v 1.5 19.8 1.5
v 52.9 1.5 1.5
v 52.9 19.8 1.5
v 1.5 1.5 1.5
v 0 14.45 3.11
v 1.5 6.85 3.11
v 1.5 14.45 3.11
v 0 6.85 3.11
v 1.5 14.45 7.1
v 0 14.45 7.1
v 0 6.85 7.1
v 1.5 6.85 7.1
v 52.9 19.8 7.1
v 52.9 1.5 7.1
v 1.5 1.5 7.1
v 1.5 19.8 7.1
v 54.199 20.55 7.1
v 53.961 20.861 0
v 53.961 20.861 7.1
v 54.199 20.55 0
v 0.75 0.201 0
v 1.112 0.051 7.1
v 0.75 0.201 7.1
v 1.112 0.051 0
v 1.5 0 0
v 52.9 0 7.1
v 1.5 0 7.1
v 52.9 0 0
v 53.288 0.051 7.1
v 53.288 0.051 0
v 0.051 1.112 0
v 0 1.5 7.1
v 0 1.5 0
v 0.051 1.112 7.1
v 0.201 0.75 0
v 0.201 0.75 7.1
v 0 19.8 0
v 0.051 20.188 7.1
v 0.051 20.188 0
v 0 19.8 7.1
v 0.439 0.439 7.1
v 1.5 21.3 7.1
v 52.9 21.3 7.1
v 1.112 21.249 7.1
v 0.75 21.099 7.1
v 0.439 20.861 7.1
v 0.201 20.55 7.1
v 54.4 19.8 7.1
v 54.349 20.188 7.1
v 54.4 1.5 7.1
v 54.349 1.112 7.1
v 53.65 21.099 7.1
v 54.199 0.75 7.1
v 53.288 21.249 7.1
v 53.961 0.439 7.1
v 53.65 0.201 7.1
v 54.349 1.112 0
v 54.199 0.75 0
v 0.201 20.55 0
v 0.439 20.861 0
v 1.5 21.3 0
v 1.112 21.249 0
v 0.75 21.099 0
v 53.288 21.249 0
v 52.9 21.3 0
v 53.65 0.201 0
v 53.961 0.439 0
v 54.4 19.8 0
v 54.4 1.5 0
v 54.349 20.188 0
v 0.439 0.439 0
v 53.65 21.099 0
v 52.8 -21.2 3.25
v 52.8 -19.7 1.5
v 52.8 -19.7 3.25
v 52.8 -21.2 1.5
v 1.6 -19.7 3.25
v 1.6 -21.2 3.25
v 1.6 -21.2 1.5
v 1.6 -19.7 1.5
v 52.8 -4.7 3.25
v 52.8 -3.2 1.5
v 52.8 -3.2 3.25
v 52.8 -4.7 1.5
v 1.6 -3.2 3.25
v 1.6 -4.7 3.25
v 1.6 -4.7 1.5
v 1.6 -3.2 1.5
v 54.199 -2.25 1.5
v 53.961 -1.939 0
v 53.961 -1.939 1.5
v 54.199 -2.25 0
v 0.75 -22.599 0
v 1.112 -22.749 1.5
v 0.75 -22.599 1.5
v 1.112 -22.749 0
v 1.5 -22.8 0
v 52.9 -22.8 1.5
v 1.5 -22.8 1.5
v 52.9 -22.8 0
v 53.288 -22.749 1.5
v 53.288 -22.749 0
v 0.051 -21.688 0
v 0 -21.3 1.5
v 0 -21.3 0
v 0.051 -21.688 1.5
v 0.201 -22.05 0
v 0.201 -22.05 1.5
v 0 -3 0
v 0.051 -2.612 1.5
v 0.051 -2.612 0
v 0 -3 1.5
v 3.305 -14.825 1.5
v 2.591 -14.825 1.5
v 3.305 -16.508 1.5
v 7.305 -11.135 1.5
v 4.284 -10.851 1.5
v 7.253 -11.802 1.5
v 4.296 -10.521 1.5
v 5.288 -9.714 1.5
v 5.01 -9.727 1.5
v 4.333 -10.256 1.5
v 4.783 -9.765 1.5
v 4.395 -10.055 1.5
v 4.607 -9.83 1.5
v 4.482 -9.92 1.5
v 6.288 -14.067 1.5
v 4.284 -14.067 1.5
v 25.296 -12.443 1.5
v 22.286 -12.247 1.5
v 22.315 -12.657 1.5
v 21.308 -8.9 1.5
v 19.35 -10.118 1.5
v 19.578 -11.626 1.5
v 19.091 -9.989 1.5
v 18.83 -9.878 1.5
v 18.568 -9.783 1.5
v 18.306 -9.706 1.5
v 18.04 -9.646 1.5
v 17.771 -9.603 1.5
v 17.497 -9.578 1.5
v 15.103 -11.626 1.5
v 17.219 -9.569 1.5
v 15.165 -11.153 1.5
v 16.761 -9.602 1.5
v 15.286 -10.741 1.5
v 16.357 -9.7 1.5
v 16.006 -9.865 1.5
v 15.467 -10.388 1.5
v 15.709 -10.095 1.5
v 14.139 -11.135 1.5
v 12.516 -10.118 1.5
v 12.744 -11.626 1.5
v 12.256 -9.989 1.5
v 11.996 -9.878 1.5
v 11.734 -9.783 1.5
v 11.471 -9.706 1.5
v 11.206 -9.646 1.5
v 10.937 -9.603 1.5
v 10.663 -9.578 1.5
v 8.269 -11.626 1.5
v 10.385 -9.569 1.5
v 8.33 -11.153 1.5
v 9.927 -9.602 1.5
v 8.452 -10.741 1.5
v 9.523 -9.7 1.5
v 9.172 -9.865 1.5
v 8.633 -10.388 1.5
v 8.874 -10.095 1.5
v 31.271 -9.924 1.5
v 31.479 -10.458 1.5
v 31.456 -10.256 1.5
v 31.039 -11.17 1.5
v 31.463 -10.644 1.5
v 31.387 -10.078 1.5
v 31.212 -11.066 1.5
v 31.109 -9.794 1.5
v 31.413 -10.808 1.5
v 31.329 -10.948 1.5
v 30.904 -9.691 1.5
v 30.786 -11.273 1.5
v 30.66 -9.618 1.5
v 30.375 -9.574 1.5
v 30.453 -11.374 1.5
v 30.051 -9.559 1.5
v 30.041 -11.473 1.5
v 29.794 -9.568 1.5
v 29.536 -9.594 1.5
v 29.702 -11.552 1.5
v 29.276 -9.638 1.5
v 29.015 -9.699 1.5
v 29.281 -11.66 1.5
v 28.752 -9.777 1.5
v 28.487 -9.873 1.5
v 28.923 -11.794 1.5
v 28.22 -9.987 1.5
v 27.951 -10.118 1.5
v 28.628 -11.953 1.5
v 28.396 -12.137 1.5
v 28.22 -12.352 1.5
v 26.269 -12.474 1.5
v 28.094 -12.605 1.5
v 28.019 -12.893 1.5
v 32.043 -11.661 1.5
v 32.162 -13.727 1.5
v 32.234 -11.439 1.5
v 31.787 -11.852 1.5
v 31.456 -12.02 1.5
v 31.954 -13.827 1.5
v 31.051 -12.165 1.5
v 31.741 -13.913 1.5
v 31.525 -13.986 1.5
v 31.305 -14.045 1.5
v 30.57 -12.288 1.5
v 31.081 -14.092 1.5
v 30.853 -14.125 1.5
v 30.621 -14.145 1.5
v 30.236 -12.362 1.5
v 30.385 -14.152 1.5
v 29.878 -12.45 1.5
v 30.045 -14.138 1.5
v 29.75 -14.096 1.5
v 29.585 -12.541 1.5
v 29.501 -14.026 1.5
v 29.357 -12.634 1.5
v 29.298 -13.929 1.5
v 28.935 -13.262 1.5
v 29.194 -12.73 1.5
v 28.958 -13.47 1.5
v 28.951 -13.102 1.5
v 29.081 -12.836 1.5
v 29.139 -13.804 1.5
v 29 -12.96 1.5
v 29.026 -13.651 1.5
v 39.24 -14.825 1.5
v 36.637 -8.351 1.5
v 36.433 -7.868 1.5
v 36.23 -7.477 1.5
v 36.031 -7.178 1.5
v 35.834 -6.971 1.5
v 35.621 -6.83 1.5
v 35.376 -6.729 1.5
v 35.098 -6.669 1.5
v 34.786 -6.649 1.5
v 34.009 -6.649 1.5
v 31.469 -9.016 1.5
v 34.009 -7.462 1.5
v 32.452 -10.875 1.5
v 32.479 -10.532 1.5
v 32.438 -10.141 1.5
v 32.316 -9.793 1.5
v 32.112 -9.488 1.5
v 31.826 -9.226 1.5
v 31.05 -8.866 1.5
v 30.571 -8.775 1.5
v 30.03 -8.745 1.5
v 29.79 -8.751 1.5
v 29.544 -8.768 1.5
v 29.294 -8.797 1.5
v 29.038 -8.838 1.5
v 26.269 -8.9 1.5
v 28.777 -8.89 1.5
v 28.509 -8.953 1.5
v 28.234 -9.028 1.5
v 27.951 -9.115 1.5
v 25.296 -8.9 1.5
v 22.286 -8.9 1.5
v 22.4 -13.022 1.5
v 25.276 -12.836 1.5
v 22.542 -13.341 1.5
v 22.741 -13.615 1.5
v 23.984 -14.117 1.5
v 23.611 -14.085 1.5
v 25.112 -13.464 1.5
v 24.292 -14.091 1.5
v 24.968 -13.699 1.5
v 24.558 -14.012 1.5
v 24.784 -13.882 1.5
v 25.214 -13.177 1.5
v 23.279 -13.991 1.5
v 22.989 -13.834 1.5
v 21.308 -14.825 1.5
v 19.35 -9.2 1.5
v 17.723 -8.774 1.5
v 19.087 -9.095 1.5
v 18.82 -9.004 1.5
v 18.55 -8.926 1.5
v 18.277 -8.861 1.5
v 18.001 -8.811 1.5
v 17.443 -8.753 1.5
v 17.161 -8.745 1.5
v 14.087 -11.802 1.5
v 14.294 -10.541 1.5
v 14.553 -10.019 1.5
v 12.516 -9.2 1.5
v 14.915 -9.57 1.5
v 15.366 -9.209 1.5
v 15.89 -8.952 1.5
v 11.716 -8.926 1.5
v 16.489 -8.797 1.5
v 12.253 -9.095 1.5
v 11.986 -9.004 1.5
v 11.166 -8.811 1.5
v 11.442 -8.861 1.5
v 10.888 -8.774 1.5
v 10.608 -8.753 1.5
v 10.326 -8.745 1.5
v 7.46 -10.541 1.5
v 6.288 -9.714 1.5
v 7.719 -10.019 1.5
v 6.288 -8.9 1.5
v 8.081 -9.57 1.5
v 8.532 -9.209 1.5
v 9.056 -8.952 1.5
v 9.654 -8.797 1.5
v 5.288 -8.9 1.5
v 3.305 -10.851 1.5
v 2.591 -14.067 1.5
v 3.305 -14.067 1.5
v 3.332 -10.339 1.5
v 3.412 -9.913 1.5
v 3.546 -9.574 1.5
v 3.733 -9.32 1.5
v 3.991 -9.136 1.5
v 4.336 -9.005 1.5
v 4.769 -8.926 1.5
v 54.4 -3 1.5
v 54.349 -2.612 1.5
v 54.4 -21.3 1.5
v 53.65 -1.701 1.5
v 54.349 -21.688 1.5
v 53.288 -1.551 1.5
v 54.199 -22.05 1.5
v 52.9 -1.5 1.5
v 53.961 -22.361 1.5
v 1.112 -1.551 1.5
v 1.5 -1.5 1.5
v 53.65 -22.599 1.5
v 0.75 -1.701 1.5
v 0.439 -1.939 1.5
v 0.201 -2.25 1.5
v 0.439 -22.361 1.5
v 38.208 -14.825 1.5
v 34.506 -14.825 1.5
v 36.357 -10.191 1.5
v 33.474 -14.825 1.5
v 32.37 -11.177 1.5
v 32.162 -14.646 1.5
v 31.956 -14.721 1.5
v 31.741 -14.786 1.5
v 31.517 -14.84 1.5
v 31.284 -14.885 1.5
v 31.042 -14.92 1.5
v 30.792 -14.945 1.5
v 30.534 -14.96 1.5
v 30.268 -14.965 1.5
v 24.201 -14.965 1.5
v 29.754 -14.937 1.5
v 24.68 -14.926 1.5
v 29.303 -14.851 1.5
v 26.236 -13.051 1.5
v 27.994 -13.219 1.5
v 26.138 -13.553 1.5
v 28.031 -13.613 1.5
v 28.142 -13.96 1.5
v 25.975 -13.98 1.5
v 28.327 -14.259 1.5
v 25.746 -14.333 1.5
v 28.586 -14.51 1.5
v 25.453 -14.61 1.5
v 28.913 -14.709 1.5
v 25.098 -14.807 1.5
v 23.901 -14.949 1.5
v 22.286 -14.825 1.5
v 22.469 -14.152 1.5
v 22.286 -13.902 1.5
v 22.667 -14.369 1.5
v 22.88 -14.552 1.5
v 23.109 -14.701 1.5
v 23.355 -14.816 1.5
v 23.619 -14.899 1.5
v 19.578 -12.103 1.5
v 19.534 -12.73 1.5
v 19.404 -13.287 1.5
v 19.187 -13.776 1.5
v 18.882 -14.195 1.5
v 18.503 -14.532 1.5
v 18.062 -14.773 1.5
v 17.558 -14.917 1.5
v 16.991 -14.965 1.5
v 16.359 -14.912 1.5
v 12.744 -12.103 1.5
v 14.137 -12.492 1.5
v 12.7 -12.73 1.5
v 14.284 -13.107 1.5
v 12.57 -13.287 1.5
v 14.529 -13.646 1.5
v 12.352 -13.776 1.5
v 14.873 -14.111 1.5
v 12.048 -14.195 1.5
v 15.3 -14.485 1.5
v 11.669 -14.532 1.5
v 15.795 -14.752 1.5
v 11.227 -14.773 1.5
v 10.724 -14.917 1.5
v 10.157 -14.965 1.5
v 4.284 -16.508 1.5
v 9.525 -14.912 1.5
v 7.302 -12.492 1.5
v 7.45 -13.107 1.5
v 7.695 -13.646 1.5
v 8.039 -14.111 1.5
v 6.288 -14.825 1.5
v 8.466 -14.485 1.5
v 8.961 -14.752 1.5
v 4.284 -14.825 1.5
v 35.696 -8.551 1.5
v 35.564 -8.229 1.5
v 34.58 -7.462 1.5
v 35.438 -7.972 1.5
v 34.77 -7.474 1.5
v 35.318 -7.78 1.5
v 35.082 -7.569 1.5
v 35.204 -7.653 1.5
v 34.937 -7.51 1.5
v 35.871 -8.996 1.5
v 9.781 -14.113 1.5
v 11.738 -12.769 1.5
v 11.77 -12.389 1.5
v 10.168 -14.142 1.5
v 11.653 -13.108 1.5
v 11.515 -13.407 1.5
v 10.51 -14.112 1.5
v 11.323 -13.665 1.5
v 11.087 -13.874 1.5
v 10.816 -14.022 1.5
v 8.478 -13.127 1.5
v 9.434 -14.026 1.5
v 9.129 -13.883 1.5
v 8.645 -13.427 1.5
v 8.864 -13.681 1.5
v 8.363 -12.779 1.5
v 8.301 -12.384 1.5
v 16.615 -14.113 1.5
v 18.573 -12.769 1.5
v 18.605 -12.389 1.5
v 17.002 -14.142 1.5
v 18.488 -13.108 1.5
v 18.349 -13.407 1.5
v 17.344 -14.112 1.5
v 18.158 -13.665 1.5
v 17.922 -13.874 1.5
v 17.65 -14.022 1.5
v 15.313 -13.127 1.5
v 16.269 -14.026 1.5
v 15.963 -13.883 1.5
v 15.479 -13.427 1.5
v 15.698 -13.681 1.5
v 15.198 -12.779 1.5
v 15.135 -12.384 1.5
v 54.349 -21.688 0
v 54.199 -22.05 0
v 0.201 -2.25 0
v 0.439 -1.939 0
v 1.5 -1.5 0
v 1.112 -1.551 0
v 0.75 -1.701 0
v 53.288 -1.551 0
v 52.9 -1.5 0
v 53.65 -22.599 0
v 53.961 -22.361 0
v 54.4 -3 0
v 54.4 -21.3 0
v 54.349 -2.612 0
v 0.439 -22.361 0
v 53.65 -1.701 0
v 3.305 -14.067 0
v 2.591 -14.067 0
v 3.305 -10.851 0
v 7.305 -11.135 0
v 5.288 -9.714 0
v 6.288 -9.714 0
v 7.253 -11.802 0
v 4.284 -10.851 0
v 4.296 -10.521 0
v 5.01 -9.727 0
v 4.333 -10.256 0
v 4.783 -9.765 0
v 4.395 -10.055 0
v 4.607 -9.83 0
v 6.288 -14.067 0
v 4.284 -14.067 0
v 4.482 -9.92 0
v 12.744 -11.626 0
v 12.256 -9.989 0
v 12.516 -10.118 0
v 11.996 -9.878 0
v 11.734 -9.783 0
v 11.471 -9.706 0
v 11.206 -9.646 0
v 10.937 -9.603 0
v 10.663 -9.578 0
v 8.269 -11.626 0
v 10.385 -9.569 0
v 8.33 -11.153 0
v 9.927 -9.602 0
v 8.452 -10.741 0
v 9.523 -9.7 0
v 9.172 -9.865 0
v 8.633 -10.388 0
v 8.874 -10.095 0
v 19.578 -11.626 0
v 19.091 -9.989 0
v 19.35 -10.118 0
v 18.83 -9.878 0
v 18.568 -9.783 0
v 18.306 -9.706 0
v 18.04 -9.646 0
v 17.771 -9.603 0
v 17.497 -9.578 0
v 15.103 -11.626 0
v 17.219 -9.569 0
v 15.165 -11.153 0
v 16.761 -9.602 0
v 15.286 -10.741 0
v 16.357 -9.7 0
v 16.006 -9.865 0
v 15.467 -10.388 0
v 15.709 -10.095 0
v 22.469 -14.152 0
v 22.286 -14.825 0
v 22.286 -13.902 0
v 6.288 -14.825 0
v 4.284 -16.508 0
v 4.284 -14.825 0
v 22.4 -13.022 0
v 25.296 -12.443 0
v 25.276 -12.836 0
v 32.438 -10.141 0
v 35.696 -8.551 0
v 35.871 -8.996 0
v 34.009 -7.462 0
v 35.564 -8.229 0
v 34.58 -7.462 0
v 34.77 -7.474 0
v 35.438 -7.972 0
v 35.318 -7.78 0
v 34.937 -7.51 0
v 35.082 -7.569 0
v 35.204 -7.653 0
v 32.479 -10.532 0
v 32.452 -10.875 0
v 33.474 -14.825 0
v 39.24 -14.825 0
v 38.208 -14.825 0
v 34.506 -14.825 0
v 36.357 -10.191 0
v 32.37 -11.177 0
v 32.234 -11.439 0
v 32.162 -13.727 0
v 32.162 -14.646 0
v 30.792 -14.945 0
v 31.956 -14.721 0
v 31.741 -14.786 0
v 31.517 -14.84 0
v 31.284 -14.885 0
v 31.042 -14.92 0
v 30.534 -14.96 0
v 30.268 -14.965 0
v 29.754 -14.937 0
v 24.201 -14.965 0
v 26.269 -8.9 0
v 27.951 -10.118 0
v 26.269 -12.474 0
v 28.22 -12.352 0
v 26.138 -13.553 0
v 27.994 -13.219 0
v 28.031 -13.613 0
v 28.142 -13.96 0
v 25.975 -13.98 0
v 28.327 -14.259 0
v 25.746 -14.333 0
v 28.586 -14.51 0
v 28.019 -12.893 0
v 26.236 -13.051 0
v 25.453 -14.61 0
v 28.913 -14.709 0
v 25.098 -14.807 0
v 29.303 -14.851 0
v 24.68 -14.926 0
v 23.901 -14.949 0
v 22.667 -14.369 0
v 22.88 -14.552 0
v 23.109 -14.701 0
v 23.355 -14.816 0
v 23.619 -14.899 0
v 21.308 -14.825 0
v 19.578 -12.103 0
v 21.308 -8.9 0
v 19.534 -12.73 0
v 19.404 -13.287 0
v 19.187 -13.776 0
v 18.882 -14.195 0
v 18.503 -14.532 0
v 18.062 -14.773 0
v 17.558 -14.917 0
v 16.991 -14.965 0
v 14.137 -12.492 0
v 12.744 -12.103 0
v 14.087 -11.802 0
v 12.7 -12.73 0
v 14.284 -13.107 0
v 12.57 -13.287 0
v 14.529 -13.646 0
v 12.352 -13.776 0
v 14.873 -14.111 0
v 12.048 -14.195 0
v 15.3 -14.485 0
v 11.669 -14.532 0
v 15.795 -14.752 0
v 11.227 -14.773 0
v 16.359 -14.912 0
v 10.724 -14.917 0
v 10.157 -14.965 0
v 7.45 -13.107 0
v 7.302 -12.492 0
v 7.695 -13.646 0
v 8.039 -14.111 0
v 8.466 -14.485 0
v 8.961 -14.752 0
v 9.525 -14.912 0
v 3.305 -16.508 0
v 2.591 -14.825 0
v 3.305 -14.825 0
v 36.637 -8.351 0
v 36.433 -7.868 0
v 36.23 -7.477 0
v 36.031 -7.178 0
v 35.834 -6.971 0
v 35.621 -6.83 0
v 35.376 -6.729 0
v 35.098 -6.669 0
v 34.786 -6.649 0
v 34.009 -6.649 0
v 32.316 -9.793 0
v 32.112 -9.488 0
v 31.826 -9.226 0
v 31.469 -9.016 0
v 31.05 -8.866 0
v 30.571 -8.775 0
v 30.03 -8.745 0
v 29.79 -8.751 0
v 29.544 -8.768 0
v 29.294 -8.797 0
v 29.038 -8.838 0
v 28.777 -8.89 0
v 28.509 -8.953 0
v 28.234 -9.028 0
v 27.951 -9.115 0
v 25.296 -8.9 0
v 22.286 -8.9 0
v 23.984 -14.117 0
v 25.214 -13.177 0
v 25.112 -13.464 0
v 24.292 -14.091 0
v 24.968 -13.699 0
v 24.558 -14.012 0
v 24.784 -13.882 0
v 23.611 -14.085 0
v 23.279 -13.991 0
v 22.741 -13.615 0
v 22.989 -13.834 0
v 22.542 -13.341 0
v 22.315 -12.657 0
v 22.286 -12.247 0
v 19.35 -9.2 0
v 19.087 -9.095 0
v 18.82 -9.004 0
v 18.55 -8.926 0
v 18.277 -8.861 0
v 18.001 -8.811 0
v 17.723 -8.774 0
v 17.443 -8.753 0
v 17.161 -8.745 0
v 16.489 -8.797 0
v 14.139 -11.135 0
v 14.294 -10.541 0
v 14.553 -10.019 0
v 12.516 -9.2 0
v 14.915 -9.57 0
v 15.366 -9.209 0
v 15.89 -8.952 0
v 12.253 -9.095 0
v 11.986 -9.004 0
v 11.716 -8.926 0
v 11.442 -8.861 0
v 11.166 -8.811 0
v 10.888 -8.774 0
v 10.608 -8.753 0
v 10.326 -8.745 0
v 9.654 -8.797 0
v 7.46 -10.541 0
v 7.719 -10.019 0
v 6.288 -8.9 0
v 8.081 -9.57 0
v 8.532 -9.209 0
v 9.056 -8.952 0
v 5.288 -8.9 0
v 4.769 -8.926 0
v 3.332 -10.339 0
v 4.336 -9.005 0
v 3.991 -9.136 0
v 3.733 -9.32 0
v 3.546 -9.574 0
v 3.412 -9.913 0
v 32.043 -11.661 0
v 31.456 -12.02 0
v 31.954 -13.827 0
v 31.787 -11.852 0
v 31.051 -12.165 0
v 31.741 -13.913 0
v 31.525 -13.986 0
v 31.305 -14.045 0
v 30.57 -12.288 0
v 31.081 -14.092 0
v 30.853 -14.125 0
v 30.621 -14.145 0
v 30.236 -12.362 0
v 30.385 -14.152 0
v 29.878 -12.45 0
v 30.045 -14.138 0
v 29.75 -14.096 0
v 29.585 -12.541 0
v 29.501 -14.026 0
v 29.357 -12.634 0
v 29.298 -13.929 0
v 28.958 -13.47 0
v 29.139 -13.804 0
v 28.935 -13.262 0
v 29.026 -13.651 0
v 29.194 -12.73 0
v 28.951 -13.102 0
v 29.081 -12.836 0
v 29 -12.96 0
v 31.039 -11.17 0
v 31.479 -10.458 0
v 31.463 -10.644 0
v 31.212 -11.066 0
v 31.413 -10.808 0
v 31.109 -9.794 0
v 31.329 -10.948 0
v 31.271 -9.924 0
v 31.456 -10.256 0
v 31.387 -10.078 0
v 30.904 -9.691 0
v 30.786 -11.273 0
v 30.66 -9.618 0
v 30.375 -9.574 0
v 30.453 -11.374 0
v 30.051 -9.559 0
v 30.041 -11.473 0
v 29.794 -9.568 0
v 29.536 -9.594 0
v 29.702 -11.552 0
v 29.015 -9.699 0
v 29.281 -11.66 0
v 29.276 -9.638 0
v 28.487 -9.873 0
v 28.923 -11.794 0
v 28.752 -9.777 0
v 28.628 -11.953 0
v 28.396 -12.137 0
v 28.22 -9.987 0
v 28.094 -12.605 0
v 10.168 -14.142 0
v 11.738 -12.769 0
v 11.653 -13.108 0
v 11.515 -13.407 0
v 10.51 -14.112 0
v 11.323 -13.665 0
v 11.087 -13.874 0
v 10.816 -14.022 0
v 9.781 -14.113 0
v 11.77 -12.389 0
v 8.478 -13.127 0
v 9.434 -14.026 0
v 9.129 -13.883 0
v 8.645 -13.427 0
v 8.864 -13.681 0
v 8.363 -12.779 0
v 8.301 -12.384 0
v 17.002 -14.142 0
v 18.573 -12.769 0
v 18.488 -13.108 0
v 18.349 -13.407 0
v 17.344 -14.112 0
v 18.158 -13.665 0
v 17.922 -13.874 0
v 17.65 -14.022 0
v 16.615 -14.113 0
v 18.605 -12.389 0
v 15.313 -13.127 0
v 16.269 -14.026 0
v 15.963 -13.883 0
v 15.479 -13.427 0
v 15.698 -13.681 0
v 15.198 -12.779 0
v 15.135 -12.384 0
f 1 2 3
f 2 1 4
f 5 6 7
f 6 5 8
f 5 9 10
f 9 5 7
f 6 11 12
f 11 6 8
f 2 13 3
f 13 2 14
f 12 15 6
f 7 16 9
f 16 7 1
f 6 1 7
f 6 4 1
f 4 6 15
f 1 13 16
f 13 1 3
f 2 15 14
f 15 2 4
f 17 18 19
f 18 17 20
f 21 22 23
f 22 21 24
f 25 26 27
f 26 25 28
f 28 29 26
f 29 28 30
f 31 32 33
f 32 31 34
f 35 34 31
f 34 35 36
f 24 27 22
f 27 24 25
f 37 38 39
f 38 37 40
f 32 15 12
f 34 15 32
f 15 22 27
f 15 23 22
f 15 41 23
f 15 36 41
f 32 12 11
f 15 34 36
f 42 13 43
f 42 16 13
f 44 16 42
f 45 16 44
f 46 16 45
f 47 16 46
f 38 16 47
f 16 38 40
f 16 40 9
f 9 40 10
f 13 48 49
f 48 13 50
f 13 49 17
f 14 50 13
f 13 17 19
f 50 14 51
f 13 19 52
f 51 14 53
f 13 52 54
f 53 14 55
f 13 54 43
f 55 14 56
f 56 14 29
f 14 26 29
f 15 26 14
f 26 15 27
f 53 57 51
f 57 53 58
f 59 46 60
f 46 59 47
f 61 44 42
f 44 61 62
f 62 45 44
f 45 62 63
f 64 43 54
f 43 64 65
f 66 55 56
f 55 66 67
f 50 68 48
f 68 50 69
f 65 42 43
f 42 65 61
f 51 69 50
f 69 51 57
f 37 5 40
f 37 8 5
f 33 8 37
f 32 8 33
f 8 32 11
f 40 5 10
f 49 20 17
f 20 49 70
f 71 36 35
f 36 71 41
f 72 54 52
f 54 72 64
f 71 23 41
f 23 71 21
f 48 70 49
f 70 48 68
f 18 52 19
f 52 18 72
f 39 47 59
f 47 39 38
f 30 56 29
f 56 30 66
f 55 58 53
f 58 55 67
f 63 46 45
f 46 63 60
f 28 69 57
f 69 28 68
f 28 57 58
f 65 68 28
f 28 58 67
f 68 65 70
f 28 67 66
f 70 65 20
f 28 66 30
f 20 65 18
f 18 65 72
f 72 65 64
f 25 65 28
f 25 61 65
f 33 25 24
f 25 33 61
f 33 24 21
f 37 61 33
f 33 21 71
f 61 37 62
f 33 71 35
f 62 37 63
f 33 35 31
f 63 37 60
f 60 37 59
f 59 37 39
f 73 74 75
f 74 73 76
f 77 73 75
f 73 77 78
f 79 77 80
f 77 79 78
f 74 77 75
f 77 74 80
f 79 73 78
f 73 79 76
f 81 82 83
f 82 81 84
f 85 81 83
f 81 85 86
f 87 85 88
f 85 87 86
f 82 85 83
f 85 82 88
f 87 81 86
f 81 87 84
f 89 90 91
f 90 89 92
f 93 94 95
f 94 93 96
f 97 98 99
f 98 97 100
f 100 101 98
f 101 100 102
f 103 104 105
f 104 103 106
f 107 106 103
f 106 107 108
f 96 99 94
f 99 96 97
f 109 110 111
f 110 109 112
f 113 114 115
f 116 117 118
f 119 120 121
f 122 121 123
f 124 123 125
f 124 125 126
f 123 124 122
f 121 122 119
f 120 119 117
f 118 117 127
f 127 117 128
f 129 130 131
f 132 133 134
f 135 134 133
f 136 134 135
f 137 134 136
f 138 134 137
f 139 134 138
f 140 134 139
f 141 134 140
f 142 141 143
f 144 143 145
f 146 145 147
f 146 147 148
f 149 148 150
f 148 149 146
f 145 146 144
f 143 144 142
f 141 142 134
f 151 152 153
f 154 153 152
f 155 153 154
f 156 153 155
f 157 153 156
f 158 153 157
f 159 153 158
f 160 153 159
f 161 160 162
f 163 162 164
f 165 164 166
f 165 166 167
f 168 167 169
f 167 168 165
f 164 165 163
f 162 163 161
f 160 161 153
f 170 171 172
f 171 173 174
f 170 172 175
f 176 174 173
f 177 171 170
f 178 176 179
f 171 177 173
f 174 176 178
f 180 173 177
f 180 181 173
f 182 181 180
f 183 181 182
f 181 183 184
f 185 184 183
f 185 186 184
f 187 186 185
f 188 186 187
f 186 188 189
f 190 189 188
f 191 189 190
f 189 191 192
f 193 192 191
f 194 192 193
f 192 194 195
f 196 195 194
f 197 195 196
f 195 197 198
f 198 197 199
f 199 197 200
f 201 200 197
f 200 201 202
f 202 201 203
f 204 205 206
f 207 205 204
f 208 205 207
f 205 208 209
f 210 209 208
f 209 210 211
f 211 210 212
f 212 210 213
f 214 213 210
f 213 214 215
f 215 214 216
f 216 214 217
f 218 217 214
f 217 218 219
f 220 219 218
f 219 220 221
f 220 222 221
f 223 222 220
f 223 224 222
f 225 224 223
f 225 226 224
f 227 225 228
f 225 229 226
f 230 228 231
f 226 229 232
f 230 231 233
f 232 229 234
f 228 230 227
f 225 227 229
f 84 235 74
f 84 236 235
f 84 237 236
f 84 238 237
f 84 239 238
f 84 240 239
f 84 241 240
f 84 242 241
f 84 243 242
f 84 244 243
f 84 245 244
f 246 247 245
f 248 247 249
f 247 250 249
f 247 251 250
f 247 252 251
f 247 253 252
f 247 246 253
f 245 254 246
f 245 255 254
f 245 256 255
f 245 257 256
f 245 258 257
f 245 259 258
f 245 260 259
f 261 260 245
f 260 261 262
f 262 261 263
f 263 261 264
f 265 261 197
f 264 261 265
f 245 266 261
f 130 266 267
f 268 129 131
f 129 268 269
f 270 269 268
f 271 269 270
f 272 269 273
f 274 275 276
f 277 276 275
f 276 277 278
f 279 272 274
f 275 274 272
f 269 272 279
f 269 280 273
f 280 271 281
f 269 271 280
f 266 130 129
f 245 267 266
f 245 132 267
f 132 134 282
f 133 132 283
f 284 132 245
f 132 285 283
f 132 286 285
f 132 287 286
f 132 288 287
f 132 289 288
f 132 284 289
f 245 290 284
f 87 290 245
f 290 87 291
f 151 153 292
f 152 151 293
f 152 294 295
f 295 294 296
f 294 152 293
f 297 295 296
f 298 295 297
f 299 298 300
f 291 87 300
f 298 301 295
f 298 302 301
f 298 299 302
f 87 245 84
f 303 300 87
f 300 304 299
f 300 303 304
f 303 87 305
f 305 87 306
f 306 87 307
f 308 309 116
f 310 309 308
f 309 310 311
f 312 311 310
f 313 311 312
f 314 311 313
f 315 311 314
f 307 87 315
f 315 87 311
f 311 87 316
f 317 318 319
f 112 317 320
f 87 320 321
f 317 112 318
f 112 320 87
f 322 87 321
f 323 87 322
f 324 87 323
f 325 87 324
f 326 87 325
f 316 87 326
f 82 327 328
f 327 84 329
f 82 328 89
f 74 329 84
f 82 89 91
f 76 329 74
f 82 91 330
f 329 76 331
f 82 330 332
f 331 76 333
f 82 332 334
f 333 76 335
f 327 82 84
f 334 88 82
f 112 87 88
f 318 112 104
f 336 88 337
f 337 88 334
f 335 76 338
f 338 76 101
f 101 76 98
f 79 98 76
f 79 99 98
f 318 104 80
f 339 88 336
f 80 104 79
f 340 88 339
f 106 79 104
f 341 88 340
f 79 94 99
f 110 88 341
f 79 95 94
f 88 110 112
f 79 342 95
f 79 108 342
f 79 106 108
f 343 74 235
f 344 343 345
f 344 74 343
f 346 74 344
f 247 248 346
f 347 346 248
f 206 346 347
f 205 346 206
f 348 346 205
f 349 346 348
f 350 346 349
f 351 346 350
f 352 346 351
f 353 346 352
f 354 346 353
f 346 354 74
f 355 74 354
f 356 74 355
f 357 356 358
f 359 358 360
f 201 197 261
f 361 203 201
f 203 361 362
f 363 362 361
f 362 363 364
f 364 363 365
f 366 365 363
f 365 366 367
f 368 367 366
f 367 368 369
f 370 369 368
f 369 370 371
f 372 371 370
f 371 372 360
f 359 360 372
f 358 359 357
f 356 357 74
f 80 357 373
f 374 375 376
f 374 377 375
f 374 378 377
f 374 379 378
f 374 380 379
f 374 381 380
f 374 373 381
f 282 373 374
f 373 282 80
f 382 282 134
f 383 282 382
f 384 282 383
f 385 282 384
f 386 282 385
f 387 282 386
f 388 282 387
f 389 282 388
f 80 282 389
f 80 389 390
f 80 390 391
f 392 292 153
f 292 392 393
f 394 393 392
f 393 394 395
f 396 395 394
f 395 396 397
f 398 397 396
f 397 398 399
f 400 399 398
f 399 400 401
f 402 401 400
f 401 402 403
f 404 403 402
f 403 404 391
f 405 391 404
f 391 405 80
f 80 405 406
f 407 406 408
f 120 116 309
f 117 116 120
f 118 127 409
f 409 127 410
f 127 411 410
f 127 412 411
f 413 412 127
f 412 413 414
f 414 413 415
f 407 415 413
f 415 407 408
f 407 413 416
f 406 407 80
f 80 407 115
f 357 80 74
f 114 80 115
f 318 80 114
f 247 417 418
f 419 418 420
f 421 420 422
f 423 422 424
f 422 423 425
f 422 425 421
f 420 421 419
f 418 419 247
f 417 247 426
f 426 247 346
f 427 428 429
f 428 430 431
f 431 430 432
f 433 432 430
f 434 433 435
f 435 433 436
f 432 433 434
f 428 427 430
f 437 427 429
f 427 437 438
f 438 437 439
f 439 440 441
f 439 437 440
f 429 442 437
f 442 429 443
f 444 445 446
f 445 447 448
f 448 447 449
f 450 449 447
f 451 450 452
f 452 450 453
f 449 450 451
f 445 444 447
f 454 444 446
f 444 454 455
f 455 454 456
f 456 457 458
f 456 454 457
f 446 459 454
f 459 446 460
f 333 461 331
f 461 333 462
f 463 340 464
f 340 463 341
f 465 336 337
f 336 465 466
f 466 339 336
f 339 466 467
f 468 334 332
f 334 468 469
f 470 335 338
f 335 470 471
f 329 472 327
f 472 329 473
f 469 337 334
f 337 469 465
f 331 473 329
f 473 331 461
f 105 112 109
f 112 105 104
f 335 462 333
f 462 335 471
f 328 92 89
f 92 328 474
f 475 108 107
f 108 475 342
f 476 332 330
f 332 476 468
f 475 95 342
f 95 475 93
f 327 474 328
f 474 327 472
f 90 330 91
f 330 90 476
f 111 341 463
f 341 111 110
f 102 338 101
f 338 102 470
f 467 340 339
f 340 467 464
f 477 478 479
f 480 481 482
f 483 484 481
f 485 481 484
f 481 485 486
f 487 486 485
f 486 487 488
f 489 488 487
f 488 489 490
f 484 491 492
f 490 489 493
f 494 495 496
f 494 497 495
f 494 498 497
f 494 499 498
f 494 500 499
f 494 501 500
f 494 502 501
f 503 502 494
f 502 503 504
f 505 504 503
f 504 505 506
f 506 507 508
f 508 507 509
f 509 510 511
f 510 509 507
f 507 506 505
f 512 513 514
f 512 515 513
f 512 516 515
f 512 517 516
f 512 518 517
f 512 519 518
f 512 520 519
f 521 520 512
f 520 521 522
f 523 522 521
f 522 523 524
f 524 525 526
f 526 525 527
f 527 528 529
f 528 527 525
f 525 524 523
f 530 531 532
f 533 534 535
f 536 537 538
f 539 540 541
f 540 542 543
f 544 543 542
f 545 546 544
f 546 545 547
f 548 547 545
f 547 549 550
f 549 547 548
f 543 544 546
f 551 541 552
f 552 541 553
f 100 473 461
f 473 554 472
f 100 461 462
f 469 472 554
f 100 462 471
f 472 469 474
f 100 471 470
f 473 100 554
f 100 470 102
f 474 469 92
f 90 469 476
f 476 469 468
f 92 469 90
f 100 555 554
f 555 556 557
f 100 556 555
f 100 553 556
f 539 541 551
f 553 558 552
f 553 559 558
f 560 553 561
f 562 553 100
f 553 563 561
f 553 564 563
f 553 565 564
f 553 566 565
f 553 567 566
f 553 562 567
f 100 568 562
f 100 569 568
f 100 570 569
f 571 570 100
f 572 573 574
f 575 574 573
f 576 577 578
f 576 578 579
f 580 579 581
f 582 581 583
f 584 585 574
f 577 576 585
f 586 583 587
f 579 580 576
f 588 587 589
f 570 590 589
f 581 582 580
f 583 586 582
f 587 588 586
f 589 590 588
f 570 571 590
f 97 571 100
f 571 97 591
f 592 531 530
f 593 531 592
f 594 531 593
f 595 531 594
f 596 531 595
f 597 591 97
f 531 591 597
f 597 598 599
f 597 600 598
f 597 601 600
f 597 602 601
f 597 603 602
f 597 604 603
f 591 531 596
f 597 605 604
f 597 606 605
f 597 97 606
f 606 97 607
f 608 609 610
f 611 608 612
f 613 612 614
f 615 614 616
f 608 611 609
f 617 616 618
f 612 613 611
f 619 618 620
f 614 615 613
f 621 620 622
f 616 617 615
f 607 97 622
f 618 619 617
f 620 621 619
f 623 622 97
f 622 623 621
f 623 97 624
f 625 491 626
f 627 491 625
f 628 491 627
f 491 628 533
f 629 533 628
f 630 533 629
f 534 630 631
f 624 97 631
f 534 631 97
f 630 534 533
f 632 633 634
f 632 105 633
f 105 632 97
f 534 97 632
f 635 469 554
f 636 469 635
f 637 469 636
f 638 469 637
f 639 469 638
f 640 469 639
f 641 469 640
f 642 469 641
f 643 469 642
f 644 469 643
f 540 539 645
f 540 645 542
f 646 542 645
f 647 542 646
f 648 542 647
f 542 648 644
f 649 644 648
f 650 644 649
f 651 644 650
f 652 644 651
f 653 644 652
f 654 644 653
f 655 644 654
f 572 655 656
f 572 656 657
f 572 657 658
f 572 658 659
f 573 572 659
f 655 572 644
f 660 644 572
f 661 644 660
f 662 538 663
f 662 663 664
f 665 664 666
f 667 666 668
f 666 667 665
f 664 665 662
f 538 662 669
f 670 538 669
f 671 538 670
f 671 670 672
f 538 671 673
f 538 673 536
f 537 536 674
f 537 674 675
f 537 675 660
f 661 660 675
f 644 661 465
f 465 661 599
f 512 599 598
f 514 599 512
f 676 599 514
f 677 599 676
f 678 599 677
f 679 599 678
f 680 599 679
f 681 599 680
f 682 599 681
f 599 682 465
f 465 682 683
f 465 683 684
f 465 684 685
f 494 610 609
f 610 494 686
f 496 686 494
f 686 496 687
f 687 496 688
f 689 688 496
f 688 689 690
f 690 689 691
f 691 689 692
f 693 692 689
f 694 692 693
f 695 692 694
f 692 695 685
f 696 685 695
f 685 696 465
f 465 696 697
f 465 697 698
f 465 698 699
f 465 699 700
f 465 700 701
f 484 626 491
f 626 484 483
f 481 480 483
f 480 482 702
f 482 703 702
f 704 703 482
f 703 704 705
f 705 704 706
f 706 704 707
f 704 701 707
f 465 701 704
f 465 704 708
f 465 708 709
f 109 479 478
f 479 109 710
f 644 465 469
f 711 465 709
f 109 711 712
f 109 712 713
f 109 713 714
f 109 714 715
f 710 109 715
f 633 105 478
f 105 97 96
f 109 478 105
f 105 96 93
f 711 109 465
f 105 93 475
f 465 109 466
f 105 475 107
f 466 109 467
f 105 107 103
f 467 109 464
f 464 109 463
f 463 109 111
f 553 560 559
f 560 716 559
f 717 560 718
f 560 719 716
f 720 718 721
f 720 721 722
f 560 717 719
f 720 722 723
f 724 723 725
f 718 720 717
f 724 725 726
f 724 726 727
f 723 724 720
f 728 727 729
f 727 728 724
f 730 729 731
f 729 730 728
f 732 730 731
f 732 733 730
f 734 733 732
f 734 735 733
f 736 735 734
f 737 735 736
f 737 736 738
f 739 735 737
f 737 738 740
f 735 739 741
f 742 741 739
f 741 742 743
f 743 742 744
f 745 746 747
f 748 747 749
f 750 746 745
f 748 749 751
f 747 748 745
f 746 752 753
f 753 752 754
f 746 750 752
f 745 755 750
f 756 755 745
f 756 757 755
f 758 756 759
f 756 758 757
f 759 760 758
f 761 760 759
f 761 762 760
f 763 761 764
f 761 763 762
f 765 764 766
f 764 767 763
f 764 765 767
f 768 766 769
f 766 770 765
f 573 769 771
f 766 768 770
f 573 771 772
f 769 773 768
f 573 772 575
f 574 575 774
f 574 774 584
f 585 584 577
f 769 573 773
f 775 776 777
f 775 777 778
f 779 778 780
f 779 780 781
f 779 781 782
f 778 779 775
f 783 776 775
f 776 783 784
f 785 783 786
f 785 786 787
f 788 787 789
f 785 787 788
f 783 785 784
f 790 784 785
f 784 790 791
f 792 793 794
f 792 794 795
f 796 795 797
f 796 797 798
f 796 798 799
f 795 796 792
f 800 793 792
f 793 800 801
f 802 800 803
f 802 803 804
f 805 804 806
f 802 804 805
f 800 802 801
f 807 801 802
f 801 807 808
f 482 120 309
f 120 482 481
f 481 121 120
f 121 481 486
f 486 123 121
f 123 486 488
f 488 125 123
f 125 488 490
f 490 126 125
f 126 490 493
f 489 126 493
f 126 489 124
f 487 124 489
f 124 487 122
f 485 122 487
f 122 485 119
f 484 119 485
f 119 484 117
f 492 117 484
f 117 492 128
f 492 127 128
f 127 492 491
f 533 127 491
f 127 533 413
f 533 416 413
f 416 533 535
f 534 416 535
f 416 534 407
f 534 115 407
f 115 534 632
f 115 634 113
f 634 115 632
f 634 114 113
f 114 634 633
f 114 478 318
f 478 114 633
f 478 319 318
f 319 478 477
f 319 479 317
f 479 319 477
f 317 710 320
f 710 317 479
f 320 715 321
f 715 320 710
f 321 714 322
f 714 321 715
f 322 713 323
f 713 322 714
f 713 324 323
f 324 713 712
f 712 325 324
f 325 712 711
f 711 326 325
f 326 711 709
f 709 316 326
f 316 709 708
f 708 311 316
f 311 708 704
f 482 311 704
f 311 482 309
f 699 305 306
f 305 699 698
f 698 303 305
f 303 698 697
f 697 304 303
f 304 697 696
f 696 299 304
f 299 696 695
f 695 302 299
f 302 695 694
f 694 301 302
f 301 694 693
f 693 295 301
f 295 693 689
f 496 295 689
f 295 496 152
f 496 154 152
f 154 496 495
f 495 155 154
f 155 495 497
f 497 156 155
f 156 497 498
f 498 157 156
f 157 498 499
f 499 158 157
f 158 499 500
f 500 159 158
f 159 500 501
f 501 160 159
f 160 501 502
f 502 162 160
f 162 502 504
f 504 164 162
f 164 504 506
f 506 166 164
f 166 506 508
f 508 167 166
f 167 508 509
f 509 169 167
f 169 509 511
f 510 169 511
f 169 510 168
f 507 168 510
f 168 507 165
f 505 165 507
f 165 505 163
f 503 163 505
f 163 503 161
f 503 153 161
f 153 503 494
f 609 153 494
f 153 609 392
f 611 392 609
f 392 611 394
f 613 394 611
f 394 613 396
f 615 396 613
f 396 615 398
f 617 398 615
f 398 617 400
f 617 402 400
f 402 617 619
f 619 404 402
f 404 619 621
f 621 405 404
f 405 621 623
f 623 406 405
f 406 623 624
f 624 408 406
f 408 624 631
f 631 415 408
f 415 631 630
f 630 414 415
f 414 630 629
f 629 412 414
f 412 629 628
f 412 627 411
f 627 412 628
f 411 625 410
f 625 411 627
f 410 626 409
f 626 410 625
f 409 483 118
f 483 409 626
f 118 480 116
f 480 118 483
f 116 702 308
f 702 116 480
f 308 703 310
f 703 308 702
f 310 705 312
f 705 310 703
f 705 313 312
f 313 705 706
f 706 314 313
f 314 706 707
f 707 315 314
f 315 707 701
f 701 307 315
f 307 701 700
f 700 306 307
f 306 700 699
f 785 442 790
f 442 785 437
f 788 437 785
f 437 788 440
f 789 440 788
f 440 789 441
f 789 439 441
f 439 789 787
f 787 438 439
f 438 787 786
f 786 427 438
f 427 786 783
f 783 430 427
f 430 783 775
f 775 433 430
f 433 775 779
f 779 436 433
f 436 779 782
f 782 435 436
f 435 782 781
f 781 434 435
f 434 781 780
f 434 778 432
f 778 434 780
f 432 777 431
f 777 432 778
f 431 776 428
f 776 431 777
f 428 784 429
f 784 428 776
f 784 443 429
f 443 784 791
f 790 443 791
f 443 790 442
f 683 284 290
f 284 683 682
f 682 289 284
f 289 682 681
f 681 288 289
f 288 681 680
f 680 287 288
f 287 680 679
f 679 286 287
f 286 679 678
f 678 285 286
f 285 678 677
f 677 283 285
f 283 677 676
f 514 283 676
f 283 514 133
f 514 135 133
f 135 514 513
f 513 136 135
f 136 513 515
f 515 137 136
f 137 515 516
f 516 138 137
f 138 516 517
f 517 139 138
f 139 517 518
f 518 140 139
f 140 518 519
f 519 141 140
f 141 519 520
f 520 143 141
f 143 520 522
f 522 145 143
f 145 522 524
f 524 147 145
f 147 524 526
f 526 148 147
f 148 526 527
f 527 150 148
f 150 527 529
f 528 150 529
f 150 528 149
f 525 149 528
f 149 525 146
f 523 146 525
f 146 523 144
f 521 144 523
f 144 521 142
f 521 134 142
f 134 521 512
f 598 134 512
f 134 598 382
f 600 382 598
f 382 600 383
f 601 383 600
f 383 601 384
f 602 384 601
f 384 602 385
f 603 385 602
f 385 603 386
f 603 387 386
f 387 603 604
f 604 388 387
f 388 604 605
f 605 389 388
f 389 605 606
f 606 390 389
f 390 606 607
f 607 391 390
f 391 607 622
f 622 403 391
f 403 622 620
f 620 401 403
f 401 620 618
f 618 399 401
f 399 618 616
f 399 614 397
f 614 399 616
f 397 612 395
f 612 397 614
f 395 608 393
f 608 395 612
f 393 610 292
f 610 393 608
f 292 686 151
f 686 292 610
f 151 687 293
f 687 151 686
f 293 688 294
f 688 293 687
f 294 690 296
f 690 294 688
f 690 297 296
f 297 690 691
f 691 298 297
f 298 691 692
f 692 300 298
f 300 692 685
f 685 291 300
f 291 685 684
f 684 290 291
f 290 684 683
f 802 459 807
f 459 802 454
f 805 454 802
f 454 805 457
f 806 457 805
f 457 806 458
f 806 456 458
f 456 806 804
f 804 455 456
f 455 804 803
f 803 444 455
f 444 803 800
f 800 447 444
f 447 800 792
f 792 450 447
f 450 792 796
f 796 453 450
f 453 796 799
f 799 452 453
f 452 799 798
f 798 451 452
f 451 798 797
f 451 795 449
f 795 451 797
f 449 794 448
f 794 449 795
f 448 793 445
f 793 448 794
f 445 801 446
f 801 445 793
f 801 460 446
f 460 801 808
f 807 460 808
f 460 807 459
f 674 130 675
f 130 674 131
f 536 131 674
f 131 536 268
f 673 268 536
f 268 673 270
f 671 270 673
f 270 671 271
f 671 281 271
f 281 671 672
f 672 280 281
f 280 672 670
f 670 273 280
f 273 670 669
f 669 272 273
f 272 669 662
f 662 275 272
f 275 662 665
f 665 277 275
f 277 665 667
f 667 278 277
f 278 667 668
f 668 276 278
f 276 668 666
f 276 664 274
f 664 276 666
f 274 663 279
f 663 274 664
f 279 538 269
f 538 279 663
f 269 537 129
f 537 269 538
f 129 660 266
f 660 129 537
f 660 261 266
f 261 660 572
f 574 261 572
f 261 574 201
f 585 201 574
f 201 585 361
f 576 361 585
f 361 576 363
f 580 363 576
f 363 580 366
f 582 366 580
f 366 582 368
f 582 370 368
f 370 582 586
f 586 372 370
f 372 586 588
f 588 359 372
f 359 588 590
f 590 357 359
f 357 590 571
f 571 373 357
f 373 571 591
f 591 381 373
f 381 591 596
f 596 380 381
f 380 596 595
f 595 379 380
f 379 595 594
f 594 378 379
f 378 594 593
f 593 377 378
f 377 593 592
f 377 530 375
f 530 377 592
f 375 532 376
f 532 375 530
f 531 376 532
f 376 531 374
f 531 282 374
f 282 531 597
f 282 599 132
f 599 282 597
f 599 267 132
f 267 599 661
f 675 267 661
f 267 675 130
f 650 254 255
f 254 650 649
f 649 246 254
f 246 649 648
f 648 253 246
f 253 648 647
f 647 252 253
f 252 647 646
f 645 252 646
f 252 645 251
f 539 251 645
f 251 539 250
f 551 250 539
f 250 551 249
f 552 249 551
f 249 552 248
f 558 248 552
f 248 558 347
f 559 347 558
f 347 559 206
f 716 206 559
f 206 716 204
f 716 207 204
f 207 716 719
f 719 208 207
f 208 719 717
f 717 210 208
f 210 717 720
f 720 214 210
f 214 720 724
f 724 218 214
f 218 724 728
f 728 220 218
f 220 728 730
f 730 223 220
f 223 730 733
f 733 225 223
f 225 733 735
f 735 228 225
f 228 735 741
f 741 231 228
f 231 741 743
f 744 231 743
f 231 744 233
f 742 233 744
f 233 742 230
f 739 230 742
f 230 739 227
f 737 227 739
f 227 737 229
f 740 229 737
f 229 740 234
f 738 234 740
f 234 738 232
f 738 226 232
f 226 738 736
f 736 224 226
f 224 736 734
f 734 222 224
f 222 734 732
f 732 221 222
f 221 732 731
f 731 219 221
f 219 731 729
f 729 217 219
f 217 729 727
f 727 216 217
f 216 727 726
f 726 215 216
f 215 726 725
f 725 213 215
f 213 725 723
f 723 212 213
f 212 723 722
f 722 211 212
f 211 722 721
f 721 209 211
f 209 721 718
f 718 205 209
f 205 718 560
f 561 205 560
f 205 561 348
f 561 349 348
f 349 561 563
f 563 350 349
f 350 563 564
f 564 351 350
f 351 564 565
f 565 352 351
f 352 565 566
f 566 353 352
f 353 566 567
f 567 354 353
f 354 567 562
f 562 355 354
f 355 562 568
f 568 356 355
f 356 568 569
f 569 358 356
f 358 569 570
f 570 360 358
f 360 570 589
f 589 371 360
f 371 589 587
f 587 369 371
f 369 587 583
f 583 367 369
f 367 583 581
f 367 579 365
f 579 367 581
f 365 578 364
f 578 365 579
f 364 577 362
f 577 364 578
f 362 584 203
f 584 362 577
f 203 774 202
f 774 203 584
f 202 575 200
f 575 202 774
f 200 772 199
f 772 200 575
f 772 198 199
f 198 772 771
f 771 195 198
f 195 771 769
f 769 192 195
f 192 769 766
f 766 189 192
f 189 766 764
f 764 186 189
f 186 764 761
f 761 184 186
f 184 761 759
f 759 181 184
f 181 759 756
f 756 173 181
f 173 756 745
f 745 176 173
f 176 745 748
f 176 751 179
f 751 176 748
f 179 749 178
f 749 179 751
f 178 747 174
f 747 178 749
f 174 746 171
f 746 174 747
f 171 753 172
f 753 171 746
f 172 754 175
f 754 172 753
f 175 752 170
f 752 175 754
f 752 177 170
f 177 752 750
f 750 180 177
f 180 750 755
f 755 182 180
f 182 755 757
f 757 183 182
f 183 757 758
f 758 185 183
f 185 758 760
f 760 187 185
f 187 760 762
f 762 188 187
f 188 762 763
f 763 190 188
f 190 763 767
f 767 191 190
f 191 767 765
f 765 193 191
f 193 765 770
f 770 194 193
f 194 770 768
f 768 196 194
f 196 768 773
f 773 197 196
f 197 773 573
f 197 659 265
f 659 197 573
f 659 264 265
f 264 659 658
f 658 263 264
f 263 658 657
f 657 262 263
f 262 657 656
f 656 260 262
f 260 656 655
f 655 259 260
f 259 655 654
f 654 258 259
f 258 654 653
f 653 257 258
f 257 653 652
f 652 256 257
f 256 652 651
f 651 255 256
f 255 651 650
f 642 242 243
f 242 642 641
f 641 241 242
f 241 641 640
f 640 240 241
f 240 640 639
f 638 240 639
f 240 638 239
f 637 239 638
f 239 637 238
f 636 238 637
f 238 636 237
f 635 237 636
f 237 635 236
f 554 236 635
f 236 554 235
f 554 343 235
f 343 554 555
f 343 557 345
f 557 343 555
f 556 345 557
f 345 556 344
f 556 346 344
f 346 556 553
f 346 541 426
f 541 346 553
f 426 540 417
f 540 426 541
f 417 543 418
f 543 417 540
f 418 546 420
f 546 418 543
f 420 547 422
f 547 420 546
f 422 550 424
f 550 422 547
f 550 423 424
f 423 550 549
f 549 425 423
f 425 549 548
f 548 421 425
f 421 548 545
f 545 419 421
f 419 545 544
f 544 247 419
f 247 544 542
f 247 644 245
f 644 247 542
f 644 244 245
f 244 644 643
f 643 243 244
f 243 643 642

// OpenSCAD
// file: Teensy++2.scad
// Teensy++ 2 
// Loic - Novemeber 2017


teensyplusplus2();

board_length 	= 51.2;
board_width		= 18.1;
board_height	= 1.6 + 4;	// board + usb connector

// reset button
module resetButton()
{
	color("grey")
		cube(size=[3,4,1], center=false);

	translate([1.5,2,1])
	color("black")
		cylinder(h=0.5, r=1, center=false, $fn=20);
}

module microUSBConnector()
{
	cube(size=[9.9 + 5,7.6,4], center=false);	// + 5 is dummy long for thick wall
}

//board
module teensyplusplus2()
{
	color("green")
		cube(size=[board_length,board_width,board_height], center=false);

	translate([45,9.05-2,board_height])
		resetButton();

	translate([-5,5.25,1.61])
		microUSBConnector();
}
// main file
// Teensy++ 2 Enclosure
// Loic - Novemeber 2017

use <Teensy++2.scad>


//TODO NEED FIXING, asymetric

board_length 	= 51.2;
board_width		= 18.1;
board_height	= 1.6 + 4;	// board + usb connector
walls_depth		= 1.5;
clearance		= 0.1;		// margin for print tolerance .1mm

label 			= "teensy";


// MAIN //

box_rounded();
translate([0,-box_width - walls_depth,0])
	top_rounded_with_label();

//box();
//translate([0,-box_width - walls_depth,0])
//	top_with_label();

//////////

font_name = "wipeoutfusion";
font_size = 7.8;
font_spacing = 1.05;

$fn=24;

///////
box_length		= walls_depth + clearance + board_length + clearance + walls_depth;
box_width		= walls_depth + clearance + board_width + clearance + walls_depth;
box_height		= walls_depth + board_height;

inside_length	= clearance + board_length + clearance;
inside_width	= clearance + board_width + clearance;
inside_height	= walls_depth + board_height;


module label()
{
	position = ((box_length - (len(label)*font_size)) / 2) - walls_depth;
	echo(position);
	// position = (len(label) * font_size) / 6.8;

	translate([position,(box_width/2)+(font_size/2.4),walls_depth*2])
	rotate([180,0,0])
	linear_extrude(walls_depth * 4)
		text(label, font = font_name, size=font_size,spacing=font_spacing);
}

module box_rounded()
{
	difference()
	{
		box_rounded_outside();
		inner_space();
	}
}

module box_rounded_outside()
{
hull()
	{
		translate([walls_depth,walls_depth ,0 ])
			cylinder(box_height, walls_depth, walls_depth, center=false );

		translate([box_length-walls_depth,walls_depth ,0 ])
			cylinder(box_height, walls_depth, walls_depth, center=false);

		translate([box_length-walls_depth, box_width-walls_depth,0 ])
			cylinder(box_height, walls_depth, walls_depth, center=false);

		translate([walls_depth,box_width - walls_depth ,0 ])
			cylinder(box_height, walls_depth, walls_depth, center=false);
	}
}

module top_rounded()
{
hull()
	{
		translate([walls_depth,walls_depth ,0 ])
			cylinder(walls_depth, walls_depth, walls_depth, center=false);

		translate([box_length-walls_depth,walls_depth ,0 ])
			cylinder(walls_depth, walls_depth, walls_depth, center=false);

		translate([box_length-walls_depth, box_width-walls_depth,0 ])
			cylinder(walls_depth, walls_depth, walls_depth, center=false);

		translate([walls_depth,box_width - walls_depth ,0 ])
			cylinder(walls_depth, walls_depth, walls_depth, center=false);
	}
	// tabs / rails
	color("purple")
	{
		translate([walls_depth + clearance, walls_depth + clearance,1])
			cube(size=[box_length - 2*(walls_depth + clearance),walls_depth,walls_depth*1.5], center=false);

		translate([walls_depth + clearance, box_width - 2 * (walls_depth + clearance) ,1])
			cube(size=[box_length - 2*(walls_depth + clearance),walls_depth,walls_depth*1.5], center=false);
	}
}

module top_rounded_with_label()
{
	difference() 
	{
		top_rounded();
		label();
	}
}

module inner_space()
{
		translate([walls_depth,walls_depth,walls_depth])
			cube(size=[inside_length,inside_width,inside_height], center=false);

		translate([walls_depth + clearance,walls_depth + clearance,walls_depth])
		 	teensyplusplus2();
}

module top_with_label()
{
	difference()
	{
		top();
		label();
	}
}

module box()
{
difference()
	{
		color("red")
			cube(size=[box_length,box_width,box_height], center=false);

		inner_space();
	}
}

module top()
{
	color("blue")
		cube(size=[box_length,box_width,walls_depth], center=false);

	// tabs / rails
	color("purple")
	{
		translate([walls_depth + clearance, walls_depth + clearance,1])
			cube(size=[box_length - 2*(walls_depth + clearance),walls_depth,walls_depth*1.5], center=false);

		translate([walls_depth + clearance, box_width - 2 * (walls_depth + clearance) ,1])
			cube(size=[box_length - 2*(walls_depth + clearance),walls_depth,walls_depth*1.5], center=false);
	}
}
